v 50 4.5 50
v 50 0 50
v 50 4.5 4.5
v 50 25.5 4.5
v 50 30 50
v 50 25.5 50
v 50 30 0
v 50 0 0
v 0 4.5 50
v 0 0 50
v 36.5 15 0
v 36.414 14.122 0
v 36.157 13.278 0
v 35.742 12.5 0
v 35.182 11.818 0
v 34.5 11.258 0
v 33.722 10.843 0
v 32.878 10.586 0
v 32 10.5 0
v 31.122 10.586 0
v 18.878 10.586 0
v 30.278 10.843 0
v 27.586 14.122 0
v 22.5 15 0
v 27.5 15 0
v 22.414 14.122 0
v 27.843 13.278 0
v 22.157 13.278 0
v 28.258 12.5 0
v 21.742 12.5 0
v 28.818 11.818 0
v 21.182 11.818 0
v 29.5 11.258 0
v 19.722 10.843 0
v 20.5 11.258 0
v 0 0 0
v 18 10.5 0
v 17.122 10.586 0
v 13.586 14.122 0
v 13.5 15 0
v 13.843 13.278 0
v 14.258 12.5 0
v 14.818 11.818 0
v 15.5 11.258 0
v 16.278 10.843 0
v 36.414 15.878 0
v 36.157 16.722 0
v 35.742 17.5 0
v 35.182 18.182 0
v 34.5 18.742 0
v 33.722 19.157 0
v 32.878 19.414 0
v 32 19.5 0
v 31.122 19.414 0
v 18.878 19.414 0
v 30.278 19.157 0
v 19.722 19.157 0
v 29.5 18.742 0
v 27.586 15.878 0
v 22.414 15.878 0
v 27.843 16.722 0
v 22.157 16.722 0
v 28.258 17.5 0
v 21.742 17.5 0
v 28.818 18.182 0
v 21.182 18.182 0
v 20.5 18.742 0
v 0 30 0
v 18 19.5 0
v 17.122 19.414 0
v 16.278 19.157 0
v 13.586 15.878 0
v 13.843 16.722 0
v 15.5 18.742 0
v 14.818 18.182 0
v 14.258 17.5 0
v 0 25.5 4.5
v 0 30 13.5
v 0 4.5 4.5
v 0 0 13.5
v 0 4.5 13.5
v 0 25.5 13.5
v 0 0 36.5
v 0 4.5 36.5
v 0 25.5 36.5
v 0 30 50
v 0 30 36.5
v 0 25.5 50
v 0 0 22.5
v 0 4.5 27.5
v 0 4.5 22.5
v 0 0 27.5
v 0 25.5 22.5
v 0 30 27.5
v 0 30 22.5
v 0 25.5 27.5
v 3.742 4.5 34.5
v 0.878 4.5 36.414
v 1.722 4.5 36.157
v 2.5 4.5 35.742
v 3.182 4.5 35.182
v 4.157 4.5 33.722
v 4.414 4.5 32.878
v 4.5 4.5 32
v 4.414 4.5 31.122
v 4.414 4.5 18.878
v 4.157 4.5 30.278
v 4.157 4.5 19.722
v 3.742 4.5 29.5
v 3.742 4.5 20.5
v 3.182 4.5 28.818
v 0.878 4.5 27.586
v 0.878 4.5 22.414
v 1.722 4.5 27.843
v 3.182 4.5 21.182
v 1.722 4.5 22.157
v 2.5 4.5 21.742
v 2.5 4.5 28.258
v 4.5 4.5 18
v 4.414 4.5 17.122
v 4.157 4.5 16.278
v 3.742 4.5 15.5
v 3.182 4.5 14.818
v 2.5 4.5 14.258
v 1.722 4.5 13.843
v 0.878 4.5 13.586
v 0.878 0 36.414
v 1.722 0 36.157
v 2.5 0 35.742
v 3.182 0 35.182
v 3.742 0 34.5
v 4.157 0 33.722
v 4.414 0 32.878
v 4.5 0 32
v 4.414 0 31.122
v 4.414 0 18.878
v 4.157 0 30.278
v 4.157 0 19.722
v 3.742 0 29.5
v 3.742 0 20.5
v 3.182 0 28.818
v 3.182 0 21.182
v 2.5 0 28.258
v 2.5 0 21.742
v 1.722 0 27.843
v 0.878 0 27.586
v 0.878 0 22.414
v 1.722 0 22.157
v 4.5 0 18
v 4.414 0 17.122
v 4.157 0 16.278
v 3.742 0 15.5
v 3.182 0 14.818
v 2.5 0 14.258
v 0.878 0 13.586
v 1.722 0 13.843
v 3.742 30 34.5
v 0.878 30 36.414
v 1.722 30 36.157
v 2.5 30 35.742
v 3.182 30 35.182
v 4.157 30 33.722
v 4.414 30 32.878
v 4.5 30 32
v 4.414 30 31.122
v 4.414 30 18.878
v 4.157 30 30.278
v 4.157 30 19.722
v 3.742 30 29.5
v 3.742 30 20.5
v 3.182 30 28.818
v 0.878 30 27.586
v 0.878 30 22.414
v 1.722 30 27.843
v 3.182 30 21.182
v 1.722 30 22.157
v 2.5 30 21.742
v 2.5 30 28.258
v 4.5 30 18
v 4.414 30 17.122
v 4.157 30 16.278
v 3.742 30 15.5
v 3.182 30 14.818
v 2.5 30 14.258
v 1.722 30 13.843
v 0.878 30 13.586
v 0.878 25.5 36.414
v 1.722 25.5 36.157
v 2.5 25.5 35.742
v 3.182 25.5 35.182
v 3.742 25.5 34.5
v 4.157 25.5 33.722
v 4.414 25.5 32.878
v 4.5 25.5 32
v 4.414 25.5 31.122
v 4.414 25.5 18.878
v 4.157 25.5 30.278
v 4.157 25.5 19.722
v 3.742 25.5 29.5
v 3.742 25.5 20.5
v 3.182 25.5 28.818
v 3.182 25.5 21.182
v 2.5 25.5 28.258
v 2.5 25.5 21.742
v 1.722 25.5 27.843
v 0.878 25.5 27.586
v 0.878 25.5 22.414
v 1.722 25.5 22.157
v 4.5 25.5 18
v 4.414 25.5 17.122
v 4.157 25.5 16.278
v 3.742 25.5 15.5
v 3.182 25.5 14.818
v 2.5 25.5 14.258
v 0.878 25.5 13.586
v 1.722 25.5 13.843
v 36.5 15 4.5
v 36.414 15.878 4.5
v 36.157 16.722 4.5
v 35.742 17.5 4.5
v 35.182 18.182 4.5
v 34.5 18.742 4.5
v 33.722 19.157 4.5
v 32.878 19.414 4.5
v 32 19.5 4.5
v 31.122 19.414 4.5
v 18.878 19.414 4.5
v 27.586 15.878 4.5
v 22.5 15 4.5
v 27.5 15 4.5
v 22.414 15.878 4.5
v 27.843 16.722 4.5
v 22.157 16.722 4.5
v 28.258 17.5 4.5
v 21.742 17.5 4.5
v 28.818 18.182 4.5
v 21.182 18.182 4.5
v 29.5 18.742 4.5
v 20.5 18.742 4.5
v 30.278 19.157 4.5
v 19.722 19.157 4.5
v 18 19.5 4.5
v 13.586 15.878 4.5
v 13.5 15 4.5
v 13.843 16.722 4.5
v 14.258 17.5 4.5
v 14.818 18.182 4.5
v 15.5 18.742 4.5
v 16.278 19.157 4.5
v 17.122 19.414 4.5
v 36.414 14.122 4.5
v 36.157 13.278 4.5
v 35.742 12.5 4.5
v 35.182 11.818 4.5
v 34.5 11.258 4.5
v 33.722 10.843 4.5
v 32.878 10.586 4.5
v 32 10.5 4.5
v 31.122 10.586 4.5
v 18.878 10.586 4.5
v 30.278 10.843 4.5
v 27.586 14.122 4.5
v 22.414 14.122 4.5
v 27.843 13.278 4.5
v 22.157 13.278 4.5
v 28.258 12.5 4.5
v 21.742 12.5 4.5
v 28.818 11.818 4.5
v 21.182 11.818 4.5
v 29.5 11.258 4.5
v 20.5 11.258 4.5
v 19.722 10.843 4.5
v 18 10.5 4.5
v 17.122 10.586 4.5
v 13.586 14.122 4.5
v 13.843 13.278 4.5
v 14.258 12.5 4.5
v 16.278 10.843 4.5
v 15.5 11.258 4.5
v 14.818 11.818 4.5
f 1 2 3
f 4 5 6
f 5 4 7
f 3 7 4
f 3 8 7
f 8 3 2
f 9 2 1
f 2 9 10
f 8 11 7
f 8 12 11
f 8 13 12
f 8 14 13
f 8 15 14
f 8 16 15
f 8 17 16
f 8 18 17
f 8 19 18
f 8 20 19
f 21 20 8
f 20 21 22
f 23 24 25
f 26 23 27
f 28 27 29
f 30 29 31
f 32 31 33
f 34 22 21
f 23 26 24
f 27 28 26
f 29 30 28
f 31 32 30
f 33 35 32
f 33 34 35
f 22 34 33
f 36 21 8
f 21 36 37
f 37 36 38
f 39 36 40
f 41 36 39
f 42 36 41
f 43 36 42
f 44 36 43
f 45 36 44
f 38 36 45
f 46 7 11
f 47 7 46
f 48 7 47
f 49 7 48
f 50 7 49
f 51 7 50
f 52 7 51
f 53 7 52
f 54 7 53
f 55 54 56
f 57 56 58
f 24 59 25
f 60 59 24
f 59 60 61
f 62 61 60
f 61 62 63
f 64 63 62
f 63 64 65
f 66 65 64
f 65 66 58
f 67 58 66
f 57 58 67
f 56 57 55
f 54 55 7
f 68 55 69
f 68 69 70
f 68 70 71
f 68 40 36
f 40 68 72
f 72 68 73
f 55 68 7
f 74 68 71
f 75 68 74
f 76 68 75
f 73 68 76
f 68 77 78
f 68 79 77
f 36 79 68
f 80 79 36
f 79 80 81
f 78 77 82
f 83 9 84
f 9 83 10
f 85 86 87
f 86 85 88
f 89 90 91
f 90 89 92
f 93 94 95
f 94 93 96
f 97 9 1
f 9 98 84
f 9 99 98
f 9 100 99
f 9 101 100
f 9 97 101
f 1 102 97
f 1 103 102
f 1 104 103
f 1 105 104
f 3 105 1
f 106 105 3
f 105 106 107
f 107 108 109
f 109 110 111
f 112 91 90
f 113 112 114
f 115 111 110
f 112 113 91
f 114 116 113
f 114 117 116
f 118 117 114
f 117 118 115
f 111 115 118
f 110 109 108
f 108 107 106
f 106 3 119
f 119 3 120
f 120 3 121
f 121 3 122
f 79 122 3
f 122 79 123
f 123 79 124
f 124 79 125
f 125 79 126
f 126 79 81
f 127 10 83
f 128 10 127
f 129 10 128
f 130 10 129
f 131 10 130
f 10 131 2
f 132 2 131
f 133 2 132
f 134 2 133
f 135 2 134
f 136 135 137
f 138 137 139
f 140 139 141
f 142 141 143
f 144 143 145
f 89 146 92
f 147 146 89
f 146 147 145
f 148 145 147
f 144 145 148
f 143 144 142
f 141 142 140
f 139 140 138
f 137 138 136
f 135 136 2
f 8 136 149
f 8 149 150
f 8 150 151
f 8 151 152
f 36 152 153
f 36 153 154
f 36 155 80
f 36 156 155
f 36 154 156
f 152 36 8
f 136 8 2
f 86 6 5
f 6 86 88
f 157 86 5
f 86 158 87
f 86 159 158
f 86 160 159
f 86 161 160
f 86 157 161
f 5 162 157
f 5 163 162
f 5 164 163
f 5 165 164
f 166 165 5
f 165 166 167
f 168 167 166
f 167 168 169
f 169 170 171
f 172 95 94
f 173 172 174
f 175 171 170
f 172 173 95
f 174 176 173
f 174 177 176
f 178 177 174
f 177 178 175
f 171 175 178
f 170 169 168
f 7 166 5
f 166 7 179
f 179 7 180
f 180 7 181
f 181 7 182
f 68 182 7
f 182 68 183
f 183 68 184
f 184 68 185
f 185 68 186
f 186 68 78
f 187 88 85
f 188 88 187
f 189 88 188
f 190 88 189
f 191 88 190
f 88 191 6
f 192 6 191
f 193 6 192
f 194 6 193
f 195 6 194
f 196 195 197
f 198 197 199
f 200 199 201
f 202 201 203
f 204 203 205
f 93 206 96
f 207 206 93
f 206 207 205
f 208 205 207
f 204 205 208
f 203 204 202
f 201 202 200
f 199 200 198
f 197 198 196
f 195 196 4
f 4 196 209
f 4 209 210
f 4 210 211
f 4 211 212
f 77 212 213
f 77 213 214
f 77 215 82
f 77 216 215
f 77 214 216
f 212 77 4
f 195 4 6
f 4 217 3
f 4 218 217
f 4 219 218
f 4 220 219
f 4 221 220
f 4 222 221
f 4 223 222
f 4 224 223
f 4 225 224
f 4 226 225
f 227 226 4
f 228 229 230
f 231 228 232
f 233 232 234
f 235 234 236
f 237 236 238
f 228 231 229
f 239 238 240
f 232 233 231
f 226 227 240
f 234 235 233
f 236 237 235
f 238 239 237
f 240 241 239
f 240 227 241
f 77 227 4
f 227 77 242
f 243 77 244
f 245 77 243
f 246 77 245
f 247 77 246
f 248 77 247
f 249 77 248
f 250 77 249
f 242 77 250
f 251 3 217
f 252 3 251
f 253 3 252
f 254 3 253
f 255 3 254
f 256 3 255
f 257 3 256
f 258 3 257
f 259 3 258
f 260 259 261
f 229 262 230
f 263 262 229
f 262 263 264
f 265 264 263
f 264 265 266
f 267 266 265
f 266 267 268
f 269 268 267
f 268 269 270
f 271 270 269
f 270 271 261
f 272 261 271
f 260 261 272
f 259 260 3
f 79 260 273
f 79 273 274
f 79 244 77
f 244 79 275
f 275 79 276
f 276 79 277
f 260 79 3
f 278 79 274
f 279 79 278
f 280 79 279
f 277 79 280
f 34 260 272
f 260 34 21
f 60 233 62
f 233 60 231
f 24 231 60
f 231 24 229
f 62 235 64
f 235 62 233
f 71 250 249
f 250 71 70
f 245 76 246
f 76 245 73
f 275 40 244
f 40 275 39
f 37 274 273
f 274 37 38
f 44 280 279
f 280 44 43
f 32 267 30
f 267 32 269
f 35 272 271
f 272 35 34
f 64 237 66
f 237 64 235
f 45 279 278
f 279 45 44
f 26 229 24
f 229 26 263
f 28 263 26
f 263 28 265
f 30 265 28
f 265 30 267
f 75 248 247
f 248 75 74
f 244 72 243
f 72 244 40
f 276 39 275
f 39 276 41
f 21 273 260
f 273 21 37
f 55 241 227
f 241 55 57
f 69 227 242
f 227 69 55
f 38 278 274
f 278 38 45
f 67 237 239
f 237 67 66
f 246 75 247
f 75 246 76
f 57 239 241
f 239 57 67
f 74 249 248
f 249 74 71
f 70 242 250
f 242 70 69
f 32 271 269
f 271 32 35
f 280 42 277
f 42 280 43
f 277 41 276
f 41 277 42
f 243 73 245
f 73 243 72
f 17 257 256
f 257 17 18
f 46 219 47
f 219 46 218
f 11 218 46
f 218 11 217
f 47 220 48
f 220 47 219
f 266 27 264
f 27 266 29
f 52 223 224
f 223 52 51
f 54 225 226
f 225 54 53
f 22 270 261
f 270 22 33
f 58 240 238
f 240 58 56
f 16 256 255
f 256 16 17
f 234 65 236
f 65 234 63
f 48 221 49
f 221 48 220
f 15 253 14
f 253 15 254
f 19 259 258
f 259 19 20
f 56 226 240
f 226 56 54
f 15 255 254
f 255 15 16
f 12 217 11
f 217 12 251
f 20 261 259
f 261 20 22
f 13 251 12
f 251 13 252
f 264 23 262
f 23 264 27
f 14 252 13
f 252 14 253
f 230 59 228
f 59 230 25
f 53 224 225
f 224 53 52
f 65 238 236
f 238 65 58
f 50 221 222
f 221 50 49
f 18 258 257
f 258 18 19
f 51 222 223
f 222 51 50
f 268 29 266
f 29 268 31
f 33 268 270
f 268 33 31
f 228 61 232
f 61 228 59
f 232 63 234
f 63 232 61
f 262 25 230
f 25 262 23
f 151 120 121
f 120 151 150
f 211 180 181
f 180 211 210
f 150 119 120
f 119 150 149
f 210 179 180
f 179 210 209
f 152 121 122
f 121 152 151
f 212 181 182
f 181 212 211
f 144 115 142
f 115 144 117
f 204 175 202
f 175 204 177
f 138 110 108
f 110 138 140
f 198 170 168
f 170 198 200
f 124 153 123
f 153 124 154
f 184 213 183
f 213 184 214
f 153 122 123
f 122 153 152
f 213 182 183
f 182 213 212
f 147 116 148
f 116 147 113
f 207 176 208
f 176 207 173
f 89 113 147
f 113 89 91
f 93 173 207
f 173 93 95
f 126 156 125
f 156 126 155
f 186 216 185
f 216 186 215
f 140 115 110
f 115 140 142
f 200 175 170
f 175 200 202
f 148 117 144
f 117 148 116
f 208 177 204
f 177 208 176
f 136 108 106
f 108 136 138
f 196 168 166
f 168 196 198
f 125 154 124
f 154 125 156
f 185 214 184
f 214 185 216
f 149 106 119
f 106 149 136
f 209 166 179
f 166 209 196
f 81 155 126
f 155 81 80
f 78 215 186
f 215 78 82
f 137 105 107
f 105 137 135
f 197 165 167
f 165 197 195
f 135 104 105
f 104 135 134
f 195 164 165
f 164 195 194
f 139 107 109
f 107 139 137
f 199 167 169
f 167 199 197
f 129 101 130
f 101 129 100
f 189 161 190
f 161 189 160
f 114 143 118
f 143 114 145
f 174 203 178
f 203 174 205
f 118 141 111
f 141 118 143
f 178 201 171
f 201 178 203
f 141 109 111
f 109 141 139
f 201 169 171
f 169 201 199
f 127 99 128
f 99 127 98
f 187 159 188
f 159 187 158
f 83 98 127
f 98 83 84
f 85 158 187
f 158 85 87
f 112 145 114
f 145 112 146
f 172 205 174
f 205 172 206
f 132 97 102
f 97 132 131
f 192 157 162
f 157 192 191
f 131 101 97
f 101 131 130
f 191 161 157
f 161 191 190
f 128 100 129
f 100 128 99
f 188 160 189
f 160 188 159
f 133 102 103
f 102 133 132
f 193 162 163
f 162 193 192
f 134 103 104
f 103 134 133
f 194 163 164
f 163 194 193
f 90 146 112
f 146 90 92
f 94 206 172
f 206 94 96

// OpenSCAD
$fn = 32;

// ----------------------------------------------------------------------
// U-bracket: 50 x 30 x 50 mm
// ----------------------------------------------------------------------

// --- parameters (mm) ---
rail_len = 50;            // outer length, X
jaw_w = 30;               // outer width, Y
jaw_h = 50;               // upright height, Z
web_t = 4.5;              // wall thickness
hole_d = 9;               // clearance for M8

module hole_z(px, py) {
  translate([px, py, -0.5]) cylinder(h = web_t + 1, d = hole_d);
}
module hole_y_pz(pz) {
  /* through both uprights along Y */
  translate([0, -0.5, pz]) rotate([-90, 0, 0]) cylinder(h = jaw_w + 1, d = hole_d);
}

module base() {
  cube([rail_len, jaw_w, web_t]);
}

module uprights() {
  cube([rail_len, web_t, jaw_h]);
  translate([0, jaw_w - web_t, 0]) cube([rail_len, web_t, jaw_h]);
}

difference() {
  union() {
    base();
    uprights();
  }
  hole_z(18, 15);
  hole_z(32, 15);
  hole_y_pz(18);
  hole_y_pz(32);
}
